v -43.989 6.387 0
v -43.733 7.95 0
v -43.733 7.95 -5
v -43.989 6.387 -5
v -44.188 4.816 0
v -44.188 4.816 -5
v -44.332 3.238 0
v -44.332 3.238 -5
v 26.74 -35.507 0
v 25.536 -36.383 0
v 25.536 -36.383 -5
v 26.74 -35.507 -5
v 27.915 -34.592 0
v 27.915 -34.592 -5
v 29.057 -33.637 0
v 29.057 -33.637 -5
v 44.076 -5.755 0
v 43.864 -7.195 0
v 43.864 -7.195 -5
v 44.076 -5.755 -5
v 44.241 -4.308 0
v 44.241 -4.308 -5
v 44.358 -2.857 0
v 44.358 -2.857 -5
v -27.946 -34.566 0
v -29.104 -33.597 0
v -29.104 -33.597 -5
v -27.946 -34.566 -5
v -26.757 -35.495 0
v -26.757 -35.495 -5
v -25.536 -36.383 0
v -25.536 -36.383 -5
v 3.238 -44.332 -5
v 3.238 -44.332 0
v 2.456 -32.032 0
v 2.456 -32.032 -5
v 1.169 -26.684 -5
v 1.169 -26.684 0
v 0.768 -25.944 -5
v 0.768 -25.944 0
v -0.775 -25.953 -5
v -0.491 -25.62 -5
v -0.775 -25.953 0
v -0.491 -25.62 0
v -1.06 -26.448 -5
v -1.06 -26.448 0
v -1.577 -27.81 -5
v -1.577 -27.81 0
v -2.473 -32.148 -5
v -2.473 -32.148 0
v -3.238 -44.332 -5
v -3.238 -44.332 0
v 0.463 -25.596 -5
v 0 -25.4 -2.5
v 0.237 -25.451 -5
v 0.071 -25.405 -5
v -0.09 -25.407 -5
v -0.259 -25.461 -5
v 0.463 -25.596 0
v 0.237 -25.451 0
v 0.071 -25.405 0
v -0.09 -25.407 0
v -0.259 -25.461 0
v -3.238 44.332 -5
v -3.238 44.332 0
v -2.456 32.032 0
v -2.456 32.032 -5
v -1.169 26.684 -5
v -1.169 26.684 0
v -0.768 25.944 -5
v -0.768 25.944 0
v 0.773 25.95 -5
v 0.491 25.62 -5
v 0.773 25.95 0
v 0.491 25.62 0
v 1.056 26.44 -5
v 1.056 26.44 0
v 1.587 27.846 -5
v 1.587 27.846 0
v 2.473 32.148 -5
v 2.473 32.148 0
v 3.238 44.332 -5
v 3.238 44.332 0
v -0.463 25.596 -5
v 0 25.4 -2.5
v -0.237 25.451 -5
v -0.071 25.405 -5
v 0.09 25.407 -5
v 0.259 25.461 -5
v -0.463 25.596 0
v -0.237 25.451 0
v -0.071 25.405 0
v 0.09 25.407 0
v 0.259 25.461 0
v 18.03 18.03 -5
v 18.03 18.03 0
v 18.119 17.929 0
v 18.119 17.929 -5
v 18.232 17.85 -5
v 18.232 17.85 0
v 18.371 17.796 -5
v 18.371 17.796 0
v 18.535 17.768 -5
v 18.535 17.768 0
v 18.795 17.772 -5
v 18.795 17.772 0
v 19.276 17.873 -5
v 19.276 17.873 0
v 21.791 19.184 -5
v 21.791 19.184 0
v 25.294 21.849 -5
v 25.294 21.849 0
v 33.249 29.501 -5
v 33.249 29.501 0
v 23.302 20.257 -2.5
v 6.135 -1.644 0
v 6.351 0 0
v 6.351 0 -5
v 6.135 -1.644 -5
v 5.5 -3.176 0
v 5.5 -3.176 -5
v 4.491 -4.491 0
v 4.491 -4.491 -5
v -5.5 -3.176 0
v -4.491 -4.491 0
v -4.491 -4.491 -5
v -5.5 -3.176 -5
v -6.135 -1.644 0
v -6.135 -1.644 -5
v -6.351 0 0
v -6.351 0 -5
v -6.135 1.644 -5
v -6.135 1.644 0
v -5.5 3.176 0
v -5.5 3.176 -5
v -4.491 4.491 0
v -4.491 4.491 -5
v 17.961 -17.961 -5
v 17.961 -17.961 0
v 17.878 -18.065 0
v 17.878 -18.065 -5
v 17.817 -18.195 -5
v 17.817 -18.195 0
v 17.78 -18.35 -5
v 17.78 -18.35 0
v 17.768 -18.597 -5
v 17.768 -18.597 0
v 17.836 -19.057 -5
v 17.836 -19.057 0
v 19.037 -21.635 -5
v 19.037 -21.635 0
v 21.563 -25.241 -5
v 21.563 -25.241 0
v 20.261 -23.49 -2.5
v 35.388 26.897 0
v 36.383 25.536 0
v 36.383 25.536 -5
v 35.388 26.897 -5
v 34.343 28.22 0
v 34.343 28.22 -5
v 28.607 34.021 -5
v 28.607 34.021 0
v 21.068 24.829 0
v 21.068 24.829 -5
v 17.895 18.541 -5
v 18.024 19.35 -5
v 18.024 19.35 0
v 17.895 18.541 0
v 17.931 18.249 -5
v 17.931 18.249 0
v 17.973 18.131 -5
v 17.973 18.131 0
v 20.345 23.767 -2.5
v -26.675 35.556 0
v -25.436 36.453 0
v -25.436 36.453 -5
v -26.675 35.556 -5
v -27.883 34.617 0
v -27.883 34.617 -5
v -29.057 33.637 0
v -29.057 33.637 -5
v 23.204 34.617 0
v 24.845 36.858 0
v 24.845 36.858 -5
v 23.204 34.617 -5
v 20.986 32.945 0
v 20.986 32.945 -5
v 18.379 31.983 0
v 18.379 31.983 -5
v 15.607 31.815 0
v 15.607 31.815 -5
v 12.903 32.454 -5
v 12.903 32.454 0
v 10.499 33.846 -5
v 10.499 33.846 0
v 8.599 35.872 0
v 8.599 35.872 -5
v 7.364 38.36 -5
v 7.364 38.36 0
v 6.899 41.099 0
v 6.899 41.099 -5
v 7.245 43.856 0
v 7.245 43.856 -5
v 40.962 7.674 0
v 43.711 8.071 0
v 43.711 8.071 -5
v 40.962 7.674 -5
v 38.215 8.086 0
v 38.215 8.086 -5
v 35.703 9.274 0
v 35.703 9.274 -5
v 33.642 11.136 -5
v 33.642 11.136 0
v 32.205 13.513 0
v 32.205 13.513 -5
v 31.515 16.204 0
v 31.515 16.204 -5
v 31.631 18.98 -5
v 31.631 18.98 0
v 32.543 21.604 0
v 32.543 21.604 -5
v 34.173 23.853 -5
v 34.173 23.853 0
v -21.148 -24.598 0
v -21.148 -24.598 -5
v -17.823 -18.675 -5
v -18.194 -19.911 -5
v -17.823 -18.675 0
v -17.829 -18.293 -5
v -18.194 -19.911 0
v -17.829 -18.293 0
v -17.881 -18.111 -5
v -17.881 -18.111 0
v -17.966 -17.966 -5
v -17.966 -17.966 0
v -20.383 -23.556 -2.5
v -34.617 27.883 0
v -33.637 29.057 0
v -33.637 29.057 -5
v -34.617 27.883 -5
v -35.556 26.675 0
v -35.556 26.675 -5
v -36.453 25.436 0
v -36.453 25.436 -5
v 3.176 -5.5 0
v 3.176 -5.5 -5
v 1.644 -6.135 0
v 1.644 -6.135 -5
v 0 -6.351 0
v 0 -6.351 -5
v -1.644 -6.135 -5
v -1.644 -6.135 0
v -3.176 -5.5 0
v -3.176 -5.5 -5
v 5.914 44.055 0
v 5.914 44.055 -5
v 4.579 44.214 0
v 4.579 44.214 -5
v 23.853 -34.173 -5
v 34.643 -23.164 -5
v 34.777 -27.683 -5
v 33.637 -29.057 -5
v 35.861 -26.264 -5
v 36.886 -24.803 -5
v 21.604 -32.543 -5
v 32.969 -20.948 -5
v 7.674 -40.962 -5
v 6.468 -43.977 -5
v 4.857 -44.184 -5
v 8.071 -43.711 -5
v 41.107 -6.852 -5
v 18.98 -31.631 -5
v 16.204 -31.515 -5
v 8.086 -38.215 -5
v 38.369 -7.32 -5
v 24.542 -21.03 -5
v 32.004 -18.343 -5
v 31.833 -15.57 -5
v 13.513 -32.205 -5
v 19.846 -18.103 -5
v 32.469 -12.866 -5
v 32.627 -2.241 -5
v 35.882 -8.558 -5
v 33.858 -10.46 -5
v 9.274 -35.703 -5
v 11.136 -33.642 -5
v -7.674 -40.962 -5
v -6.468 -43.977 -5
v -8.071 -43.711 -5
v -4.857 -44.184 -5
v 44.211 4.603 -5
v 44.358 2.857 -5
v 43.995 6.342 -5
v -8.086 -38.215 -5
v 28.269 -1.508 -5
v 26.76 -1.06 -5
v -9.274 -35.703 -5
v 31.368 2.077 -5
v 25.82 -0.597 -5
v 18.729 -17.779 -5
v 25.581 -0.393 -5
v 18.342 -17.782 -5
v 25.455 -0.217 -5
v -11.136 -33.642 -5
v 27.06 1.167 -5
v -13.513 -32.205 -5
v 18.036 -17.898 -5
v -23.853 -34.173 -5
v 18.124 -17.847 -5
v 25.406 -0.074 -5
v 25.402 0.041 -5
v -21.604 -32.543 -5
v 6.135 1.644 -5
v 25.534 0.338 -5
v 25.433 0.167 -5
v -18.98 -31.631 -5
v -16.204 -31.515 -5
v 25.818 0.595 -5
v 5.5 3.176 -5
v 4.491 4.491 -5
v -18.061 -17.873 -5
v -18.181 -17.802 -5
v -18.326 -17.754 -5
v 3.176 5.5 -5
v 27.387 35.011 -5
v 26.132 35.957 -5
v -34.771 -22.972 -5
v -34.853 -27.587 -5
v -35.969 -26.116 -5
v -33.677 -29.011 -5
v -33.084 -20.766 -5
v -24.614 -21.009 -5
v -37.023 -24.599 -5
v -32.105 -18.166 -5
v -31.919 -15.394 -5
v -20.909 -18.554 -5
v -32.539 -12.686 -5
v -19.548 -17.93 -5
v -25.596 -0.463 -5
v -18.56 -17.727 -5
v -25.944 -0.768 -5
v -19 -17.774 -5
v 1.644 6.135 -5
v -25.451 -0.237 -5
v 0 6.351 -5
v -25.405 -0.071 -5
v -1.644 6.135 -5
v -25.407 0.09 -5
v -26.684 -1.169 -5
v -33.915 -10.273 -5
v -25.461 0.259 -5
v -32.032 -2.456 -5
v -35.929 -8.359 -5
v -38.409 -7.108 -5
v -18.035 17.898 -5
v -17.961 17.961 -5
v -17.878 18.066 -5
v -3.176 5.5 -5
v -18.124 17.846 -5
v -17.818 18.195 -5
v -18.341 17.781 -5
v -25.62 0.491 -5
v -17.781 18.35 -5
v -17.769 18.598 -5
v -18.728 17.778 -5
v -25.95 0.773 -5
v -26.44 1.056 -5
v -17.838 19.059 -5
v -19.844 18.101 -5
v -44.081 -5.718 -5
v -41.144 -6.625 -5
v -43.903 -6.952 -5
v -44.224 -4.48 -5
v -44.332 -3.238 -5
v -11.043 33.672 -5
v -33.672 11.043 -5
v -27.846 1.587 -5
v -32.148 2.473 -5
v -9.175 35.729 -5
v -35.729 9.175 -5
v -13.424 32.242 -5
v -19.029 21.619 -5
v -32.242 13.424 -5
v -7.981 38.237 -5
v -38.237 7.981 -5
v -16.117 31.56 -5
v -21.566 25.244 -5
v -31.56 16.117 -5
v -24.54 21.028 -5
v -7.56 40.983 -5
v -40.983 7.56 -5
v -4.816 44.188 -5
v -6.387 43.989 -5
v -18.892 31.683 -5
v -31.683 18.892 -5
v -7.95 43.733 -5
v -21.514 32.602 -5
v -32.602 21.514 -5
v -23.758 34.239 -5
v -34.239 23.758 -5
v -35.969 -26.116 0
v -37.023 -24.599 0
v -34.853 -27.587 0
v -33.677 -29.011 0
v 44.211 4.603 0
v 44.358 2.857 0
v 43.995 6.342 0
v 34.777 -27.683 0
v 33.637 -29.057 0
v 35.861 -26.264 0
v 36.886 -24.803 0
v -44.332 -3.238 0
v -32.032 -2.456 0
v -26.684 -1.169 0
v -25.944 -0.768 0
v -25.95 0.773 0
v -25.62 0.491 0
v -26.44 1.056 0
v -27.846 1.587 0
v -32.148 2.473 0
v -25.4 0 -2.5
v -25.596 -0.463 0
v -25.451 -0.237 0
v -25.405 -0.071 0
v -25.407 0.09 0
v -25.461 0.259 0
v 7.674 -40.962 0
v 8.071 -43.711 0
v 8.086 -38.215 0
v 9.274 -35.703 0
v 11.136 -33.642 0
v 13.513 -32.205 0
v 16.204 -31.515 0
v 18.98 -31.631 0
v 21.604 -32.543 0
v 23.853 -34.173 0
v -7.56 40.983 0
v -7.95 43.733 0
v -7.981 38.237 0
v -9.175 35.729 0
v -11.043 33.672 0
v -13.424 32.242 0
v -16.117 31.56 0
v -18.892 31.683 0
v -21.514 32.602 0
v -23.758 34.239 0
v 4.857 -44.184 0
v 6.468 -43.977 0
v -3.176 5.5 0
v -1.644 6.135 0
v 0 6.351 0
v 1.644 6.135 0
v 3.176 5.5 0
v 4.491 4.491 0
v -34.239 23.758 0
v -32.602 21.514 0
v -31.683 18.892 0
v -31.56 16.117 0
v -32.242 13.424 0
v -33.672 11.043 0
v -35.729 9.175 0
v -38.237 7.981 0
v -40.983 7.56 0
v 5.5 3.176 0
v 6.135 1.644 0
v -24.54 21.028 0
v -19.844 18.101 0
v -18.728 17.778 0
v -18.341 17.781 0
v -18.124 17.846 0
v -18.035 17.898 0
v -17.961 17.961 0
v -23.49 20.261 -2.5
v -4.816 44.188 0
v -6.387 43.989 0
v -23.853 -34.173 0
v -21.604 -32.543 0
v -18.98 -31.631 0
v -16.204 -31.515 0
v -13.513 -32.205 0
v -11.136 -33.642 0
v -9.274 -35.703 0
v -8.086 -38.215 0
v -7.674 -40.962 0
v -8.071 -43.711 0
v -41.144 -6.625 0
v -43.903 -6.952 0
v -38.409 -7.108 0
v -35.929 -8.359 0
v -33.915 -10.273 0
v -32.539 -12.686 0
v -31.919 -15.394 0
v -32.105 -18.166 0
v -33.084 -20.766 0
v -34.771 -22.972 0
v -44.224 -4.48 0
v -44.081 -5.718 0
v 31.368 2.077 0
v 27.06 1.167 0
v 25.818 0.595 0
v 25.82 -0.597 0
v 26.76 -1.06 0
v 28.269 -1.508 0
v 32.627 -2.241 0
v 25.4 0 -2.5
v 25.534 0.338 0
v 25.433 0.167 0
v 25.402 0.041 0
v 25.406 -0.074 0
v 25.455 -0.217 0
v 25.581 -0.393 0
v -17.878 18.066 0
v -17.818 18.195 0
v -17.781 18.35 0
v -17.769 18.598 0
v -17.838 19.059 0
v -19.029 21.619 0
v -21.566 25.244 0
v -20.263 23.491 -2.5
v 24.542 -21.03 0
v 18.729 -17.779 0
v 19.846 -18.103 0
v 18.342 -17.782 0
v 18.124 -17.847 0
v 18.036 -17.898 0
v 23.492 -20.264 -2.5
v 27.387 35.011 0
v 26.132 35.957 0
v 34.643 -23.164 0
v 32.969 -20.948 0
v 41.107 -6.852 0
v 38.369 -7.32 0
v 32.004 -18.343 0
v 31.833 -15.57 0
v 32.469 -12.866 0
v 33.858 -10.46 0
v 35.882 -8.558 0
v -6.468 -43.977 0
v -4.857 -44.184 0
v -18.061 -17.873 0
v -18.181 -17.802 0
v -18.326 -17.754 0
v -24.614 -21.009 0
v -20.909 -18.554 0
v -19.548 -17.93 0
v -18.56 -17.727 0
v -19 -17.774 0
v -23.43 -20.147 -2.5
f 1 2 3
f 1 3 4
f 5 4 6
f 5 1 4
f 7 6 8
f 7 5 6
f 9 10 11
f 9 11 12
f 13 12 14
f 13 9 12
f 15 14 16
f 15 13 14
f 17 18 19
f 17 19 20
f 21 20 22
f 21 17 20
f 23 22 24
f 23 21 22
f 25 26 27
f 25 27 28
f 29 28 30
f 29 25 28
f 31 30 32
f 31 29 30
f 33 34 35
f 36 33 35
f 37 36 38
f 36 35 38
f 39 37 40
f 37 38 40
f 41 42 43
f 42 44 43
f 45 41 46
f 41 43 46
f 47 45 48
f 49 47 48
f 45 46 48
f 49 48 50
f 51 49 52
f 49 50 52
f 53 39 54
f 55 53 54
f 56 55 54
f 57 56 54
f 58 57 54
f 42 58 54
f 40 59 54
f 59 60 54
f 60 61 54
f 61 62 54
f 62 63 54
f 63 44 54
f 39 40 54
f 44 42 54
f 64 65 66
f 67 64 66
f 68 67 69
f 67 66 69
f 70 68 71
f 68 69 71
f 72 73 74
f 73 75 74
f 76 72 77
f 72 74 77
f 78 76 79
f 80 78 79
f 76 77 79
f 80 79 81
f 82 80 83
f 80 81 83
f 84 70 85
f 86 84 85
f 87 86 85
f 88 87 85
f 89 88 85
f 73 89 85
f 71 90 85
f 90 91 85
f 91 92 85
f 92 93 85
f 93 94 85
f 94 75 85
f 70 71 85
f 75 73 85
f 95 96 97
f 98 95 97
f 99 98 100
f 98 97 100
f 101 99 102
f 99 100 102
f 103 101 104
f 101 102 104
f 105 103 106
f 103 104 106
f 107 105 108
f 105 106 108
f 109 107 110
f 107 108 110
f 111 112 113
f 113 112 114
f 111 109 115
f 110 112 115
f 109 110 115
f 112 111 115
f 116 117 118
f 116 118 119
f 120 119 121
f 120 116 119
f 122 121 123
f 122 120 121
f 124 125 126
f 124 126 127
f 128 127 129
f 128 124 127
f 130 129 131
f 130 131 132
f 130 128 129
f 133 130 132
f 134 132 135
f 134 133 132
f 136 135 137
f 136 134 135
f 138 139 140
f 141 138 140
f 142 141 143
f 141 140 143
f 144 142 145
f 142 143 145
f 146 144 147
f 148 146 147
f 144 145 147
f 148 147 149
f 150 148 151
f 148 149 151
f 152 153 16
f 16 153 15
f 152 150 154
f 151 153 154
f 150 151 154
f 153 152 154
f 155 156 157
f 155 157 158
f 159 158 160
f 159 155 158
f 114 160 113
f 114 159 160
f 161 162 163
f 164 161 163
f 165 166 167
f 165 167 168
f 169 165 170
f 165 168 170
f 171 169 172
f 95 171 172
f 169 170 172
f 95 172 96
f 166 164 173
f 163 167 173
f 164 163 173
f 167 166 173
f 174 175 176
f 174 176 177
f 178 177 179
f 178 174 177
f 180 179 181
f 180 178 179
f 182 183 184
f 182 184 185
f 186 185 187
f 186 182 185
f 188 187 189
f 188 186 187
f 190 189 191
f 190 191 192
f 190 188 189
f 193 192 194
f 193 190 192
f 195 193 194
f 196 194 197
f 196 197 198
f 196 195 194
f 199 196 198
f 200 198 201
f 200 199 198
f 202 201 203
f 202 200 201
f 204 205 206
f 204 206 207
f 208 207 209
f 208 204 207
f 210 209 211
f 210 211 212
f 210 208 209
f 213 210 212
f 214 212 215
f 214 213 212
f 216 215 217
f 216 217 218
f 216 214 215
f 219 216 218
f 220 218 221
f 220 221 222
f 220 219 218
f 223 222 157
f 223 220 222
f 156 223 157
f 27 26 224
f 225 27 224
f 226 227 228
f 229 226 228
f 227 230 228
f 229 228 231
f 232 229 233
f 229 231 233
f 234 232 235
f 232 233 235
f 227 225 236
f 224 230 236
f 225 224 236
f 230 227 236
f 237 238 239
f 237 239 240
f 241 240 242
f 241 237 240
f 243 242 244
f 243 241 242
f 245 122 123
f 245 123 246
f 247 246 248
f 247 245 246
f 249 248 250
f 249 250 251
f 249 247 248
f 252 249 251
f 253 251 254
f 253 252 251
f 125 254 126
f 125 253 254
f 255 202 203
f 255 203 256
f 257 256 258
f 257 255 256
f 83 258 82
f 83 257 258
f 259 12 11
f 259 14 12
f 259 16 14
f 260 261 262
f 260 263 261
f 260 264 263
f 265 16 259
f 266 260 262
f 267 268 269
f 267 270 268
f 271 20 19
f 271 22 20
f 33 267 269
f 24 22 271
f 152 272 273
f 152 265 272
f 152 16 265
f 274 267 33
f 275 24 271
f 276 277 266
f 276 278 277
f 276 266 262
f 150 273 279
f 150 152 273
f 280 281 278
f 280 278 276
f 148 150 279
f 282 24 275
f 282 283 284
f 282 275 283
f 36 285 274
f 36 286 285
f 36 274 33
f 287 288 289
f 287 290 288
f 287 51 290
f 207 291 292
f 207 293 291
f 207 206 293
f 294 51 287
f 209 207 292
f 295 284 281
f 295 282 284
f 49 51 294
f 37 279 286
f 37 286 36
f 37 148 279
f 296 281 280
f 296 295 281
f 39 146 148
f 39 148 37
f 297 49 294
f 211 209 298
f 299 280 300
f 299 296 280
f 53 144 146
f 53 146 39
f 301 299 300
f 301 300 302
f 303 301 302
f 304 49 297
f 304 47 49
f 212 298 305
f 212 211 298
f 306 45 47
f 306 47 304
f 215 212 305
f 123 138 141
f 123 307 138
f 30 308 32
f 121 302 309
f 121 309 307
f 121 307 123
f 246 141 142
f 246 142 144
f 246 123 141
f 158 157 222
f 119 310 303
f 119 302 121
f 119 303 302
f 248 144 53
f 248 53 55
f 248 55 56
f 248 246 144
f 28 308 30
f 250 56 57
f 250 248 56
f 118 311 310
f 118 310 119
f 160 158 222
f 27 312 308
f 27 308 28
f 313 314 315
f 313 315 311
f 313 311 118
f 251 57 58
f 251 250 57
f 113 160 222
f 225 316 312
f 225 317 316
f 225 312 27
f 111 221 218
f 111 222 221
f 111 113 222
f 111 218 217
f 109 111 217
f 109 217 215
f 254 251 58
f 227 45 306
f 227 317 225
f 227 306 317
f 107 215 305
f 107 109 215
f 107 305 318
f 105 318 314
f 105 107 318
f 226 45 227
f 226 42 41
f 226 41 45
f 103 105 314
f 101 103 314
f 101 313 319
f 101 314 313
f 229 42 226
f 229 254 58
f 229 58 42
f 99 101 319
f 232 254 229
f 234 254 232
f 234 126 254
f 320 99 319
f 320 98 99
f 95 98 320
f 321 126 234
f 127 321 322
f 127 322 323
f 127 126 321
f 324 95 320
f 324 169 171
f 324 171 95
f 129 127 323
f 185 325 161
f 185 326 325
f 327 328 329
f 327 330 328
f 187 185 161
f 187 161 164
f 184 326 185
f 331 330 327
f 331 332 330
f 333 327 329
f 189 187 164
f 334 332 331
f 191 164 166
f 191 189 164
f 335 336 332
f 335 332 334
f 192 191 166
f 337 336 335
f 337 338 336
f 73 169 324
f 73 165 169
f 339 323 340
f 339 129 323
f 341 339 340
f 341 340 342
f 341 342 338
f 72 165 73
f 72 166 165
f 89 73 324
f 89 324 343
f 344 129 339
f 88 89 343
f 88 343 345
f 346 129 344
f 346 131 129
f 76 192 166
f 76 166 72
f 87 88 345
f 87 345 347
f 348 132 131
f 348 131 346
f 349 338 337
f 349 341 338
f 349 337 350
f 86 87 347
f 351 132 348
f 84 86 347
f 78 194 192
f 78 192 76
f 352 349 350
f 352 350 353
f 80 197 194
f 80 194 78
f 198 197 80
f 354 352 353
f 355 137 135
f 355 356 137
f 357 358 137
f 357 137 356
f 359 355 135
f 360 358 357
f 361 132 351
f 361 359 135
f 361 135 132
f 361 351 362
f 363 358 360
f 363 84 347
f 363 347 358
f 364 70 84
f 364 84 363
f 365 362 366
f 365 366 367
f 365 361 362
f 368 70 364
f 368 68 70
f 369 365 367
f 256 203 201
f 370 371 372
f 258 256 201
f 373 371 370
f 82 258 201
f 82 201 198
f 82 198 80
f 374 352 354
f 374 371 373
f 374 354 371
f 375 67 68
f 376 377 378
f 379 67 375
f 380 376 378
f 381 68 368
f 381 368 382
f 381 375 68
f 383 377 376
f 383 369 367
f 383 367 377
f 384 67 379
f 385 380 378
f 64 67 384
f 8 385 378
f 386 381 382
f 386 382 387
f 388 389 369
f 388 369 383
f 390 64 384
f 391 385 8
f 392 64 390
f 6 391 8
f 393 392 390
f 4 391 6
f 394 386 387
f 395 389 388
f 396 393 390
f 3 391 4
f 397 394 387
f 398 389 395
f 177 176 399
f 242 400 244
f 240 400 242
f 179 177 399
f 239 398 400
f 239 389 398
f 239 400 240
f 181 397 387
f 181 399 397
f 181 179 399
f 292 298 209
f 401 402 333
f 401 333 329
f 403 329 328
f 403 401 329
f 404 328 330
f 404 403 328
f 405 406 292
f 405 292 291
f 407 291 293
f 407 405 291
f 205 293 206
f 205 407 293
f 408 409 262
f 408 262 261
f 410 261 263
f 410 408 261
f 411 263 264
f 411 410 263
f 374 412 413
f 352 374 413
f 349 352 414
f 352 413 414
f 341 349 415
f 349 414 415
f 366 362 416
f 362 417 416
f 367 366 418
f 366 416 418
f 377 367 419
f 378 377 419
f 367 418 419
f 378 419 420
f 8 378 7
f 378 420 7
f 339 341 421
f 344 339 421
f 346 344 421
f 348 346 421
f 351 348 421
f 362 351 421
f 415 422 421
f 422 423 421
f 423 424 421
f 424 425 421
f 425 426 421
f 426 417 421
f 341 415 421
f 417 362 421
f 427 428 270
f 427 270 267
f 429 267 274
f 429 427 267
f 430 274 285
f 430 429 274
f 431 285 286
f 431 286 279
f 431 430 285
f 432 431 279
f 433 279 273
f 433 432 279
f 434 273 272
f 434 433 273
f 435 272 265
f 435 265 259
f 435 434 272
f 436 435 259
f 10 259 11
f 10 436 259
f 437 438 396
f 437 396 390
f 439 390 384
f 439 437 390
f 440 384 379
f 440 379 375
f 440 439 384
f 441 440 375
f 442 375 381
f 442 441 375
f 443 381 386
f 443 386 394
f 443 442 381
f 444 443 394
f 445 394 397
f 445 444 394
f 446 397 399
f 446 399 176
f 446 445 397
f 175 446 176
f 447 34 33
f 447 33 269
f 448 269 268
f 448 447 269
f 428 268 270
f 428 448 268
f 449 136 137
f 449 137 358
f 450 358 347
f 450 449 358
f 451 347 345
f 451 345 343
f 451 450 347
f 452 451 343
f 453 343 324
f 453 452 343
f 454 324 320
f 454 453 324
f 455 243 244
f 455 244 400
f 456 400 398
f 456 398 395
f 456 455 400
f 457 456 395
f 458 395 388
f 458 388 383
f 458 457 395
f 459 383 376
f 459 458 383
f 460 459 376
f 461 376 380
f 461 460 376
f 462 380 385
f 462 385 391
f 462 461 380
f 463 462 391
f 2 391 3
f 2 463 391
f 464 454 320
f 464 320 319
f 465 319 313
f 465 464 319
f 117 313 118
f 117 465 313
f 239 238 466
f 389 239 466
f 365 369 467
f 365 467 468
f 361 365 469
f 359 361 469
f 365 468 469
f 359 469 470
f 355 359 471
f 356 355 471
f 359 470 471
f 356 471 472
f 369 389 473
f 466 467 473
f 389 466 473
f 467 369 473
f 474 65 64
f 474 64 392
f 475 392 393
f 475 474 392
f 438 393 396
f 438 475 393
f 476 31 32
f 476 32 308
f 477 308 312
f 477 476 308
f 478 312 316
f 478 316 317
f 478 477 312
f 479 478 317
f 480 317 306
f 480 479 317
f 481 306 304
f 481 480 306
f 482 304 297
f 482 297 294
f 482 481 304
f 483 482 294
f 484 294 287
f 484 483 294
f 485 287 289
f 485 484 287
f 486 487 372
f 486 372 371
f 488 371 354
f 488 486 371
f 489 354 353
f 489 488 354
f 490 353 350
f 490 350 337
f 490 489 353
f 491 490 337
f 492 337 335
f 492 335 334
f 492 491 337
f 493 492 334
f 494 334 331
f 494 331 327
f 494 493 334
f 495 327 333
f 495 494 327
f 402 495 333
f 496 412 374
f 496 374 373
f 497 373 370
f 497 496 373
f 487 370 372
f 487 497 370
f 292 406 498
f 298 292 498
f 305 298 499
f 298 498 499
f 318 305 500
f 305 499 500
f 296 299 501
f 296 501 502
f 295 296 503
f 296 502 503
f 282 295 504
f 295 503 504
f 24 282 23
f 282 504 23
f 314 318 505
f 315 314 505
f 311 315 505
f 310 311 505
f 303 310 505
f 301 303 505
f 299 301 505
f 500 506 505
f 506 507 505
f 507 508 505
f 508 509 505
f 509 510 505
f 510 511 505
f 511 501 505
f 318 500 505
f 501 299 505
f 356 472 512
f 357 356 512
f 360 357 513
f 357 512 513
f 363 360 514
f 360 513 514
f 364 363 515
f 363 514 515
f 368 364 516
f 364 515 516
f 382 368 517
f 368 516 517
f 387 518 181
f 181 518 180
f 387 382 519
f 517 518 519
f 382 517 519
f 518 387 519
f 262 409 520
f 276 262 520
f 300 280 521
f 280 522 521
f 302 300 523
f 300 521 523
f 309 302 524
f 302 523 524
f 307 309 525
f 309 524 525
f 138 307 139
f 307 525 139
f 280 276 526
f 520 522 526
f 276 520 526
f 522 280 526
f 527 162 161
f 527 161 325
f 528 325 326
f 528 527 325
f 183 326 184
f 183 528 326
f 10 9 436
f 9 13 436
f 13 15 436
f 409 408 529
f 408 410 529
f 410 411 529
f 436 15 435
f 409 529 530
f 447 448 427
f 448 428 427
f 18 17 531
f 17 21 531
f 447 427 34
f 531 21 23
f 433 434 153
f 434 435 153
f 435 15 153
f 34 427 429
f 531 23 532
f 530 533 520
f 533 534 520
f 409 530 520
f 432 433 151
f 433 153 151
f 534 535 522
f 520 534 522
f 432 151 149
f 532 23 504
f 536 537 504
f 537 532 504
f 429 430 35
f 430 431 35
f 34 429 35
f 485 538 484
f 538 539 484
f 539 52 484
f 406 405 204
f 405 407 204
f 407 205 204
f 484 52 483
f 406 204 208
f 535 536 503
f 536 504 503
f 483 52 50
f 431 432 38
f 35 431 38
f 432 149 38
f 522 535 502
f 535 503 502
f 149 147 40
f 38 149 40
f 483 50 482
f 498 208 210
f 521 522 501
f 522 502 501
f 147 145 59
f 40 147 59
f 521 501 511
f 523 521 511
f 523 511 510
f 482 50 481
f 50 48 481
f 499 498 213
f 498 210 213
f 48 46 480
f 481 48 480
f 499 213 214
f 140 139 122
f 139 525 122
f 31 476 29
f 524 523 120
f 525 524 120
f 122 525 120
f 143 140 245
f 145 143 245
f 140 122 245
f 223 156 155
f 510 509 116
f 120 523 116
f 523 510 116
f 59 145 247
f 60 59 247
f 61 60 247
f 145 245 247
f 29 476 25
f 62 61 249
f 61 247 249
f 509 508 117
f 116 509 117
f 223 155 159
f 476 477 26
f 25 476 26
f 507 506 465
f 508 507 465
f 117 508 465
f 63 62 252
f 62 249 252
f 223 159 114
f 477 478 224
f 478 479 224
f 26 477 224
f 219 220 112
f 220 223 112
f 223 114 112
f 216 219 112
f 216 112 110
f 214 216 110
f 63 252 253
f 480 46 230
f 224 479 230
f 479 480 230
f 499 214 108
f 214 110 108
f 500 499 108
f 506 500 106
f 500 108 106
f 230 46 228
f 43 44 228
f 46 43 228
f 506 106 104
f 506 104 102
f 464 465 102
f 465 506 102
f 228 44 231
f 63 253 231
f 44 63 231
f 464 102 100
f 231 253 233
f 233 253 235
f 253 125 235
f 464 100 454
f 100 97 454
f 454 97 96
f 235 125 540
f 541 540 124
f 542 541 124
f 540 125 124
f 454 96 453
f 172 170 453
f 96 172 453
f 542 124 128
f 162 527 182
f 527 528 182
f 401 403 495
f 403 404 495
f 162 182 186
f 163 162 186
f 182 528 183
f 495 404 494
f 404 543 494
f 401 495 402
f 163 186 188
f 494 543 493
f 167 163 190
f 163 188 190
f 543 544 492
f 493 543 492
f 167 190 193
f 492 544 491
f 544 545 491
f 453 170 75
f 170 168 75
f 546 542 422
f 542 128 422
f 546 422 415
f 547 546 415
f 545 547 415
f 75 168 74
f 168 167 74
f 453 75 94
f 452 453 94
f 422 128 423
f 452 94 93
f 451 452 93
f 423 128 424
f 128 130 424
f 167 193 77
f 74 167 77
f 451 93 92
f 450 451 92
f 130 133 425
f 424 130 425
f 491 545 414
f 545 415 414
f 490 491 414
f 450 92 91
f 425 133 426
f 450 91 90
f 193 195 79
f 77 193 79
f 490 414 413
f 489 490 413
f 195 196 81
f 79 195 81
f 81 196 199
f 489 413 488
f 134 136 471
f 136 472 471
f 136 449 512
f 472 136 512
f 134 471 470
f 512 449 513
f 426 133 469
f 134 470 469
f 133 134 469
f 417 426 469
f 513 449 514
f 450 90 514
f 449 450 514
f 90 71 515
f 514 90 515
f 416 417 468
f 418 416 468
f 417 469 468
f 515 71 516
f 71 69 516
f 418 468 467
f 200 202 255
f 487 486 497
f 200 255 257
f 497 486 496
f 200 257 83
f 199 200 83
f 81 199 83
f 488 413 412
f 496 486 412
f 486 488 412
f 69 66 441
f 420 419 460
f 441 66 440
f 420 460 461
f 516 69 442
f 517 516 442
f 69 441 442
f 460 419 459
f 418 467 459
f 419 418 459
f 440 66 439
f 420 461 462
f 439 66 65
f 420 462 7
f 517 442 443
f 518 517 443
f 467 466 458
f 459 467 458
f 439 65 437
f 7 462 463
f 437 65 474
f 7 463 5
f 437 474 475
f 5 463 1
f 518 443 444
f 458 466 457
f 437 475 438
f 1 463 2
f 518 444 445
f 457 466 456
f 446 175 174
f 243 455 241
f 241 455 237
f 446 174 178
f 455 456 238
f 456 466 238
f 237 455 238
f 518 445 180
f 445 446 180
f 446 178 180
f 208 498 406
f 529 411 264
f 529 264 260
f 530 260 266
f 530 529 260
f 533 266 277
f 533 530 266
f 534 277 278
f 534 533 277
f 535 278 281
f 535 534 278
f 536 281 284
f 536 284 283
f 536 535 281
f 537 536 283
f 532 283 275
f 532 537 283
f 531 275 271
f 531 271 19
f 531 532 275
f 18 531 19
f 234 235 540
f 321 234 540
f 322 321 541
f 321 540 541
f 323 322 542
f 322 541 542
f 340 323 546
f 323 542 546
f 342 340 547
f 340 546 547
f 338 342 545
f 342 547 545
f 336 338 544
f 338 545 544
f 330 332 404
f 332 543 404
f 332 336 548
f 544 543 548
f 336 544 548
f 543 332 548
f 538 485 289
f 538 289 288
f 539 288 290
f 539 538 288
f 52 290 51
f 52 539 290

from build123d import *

# Parameters (mm, degrees)
F1_DEPTH = 5


with BuildPart() as f1:
    # F0 (on Top) → F1 (new body)
    with BuildSketch(Plane.XY):
        with BuildLine():
            add(Edge.make_bspline(
                [(17.960512809, -17.960512809), (15.6802243454, -20.2331445456), (29.0574428343, -33.6372935287)],
                knots=[6.282890907, 6.282890907, 6.282890907, 7.8477722056, 7.8477722056, 7.8477722056], degree=2, weights=[1, 0.7091949639, 1]))
            Line((17.960512809, -17.960512809), (4.4910260861, -4.4910260861))
            ThreePointArc((4.4910260861, -4.4910260861), (0, -6.35127), (-4.4910260861, -4.4910260861))
            Line((-4.4910260861, -4.4910260861), (-17.9660364379, -17.9660364379))
            add(Edge.make_bspline(
                [(-29.1037800474, -33.5972095114), (-15.9810329654, -20.44676612), (-17.9660364379, -17.9660364379)],
                knots=[1.576997225, 1.576997225, 1.576997225, 3.1227237577, 3.1227237577, 3.1227237577], degree=2, weights=[1, 0.7159145089, 1]))
            ThreePointArc((-29.1037800474, -33.5972095114), (-27.3554893491, -35.0354064122), (-25.5362426788, -36.3827268061))
            ThreePointArc((-25.5362426788, -36.3827268061), (-13.5131315962, -32.2048272696), (-8.0710910961, -43.7110968579))
            ThreePointArc((-8.0710910961, -43.7110968579), (-5.6632765753, -44.0877511156), (-3.2384377382, -44.3318736466))
            add(Edge.make_bspline(
                [(3.2384377382, -44.3318736466), (3.2184803968, -25.4), (0, -25.4), (-3.2184803968, -25.4), (-3.2384377382, -44.3318736466)],
                knots=[4.7185898786, 4.7185898786, 4.7185898786, 6.2831853072, 6.2831853072, 7.8477807358, 7.8477807358, 7.8477807358], degree=2, weights=[1, 0.7092957276, 1, 0.7092957276, 1]))
            ThreePointArc((3.2384377382, -44.3318736466), (5.6632776972, -44.0877509715), (8.0710933206, -43.7110964471))
            ThreePointArc((8.0710933206, -43.7110964471), (13.5131332351, -32.2048265819), (25.5362445304, -36.3827255066))
            ThreePointArc((25.5362445304, -36.3827255066), (27.3313377683, -35.0542504669), (29.0574428343, -33.6372935287))
        make_face()
        with BuildLine():
            add(Edge.make_bspline(
                [(44.3580588388, 2.8574667196), (25.4, 2.843741946), (25.4, 0), (25.4, -2.843741946), (44.3580588388, -2.8574667196)],
                knots=[4.7172153068, 4.7172153068, 4.7172153068, 6.2831853072, 6.2831853072, 7.8491553076, 7.8491553076, 7.8491553076], degree=2, weights=[1, 0.7088110847, 1, 0.7088110847, 1]))
            ThreePointArc((44.3580588388, 2.8574667196), (44.1116709386, 5.4738457236), (43.7110967552, 8.0710916523))
            ThreePointArc((43.7110967552, 8.0710916523), (32.2048270977, 13.5131320059), (36.3827264812, 25.5362431418))
            ThreePointArc((36.3827264812, 25.5362431418), (34.8720687583, 27.5634054594), (33.2486042571, 29.5014036099))
            add(Edge.make_bspline(
                [(18.0297160686, 18.0297160686), (19.9566530018, 15.2356768134), (33.2486042571, 29.5014036099)],
                knots=[3.1036959155, 3.1036959155, 3.1036959155, 4.6978570798, 4.6978570798, 4.6978570798], degree=2, weights=[1, 0.6987979995, 1]))
            Line((18.0297160686, 18.0297160686), (4.4910260861, 4.4910260861))
            ThreePointArc((4.4910260861, 4.4910260861), (5.8678083585, 2.4305258035), (6.35127, 0))
            ThreePointArc((6.35127, 0), (5.8678083585, -2.4305258035), (4.4910260861, -4.4910260861))
            Line((4.4910260861, -4.4910260861), (17.960512809, -17.960512809))
            add(Edge.make_bspline(
                [(33.6372860032, -29.0574515459), (20.2394978879, -15.6891800806), (17.960512809, -17.960512809)],
                knots=[4.7185813484, 4.7185813484, 4.7185813484, 6.282890907, 6.282890907, 6.282890907], degree=2, weights=[1, 0.7093964769, 1]))
            ThreePointArc((33.6372860032, -29.0574515459), (35.3259920878, -26.9791916672), (36.8864875406, -24.803014674))
            ThreePointArc((36.8864875406, -24.803014674), (32.4688107335, -12.8659222194), (43.8638664264, -7.1947009755))
            ThreePointArc((43.8638664264, -7.1947009755), (44.1642380736, -5.0321541488), (44.3580588388, -2.8574667196))
        make_face()
        with BuildLine():
            Line((4.4910260861, 4.4910260861), (18.0297160686, 18.0297160686))
            add(Edge.make_bspline(
                [(28.6070931031, 34.0211217362), (16.2285166945, 20.6414371225), (18.0297160686, 18.0297160686)],
                knots=[1.576997225, 1.576997225, 1.576997225, 3.1036959155, 3.1036959155, 3.1036959155], degree=2, weights=[1, 0.7225245136, 1]))
            ThreePointArc((28.6070931031, 34.0211217362), (26.7637763288, 35.4894741666), (24.8452280049, 36.8580675753))
            ThreePointArc((24.8452280049, 36.8580675753), (12.9030857851, 32.4540598727), (7.2449139151, 43.8556008095))
            ThreePointArc((7.2449139151, 43.8556008095), (5.247082468, 44.1392186788), (3.2384377382, 44.3318736466))
            add(Edge.make_bspline(
                [(-3.2384377382, 44.3318736466), (-3.2184803968, 25.4), (0, 25.4), (3.2184803968, 25.4), (3.2384377382, 44.3318736466)],
                knots=[1.576997225, 1.576997225, 1.576997225, 3.1415926536, 3.1415926536, 4.7061880822, 4.7061880822, 4.7061880822], degree=2, weights=[1, 0.7092957276, 1, 0.7092957276, 1]))
            ThreePointArc((-3.2384377382, 44.3318736466), (-5.6023539167, 44.0955341343), (-7.950266755, 43.7332340277))
            ThreePointArc((-7.950266755, 43.7332340277), (-13.4240835005, 32.2420471926), (-25.4356032496, 36.4531560682))
            ThreePointArc((-25.4356032496, 36.4531560682), (-27.2828792759, 35.091979118), (-29.0574503266, 33.6372870565))
            add(Edge.make_bspline(
                [(-17.9605125358, 17.9605125358), (-15.6879254577, 20.2386077571), (-29.0574503266, 33.6372870565)],
                knots=[0.0002118916, 0.0002118916, 0.0002118916, 1.5646015681, 1.5646015681, 1.5646015681], degree=2, weights=[1, 0.7093682423, 1]))
            Line((-17.9605125358, 17.9605125358), (-4.4910260861, 4.4910260861))
            ThreePointArc((-4.4910260861, 4.4910260861), (0, 6.35127), (4.4910260861, 4.4910260861))
        make_face()
        with BuildLine():
            ThreePointArc((-4.4910260861, -4.4910260861), (-6.35127, 0), (-4.4910260861, 4.4910260861))
            Line((-4.4910260861, 4.4910260861), (-17.9605125358, 17.9605125358))
            add(Edge.make_bspline(
                [(-33.6372924729, 29.0574440565), (-20.2340350033, 15.6814796579), (-17.9605125358, 17.9605125358)],
                knots=[4.7185960181, 4.7185960181, 4.7185960181, 6.2833971988, 6.2833971988, 6.2833971988], degree=2, weights=[1, 0.7092232054, 1]))
            ThreePointArc((-33.6372924729, 29.0574440565), (-35.0919796241, 27.2828786249), (-36.4531522707, 25.4356086919))
            ThreePointArc((-36.4531522707, 25.4356086919), (-32.2420451884, 13.4240883142), (-43.7332328408, 7.9502732843))
            ThreePointArc((-43.7332328408, 7.9502732843), (-44.0955337161, 5.6023572084), (-44.3318736466, 3.2384377382))
            add(Edge.make_bspline(
                [(-44.3318736466, -3.2384377382), (-25.4, -3.2184803968), (-25.4, 0), (-25.4, 3.2184803968), (-44.3318736466, 3.2384377382)],
                knots=[1.576997225, 1.576997225, 1.576997225, 3.1415926536, 3.1415926536, 4.7061880822, 4.7061880822, 4.7061880822], degree=2, weights=[1, 0.7092957276, 1, 0.7092957276, 1]))
            ThreePointArc((-44.3318736466, -3.2384377382), (-44.1564712104, -5.0998578651), (-43.9029457794, -6.9522551658))
            ThreePointArc((-43.9029457794, -6.9522551658), (-32.5393959561, -12.686344462), (-37.0229545531, -24.598848269))
            ThreePointArc((-37.0229545531, -24.598848269), (-35.4189008641, -26.8571026281), (-33.6773037539, -29.011061888))
            add(Edge.make_bspline(
                [(-17.9660364379, -17.9660364379), (-20.0264213053, -15.3910999362), (-33.6773037539, -29.011061888)],
                knots=[3.1227237577, 3.1227237577, 3.1227237577, 4.7057194921, 4.7057194921, 4.7057194921], degree=2, weights=[1, 0.7027805116, 1]))
            Line((-17.9660364379, -17.9660364379), (-4.4910260861, -4.4910260861))
        make_face()
    extrude(amount=-F1_DEPTH)


solid = f1.part
